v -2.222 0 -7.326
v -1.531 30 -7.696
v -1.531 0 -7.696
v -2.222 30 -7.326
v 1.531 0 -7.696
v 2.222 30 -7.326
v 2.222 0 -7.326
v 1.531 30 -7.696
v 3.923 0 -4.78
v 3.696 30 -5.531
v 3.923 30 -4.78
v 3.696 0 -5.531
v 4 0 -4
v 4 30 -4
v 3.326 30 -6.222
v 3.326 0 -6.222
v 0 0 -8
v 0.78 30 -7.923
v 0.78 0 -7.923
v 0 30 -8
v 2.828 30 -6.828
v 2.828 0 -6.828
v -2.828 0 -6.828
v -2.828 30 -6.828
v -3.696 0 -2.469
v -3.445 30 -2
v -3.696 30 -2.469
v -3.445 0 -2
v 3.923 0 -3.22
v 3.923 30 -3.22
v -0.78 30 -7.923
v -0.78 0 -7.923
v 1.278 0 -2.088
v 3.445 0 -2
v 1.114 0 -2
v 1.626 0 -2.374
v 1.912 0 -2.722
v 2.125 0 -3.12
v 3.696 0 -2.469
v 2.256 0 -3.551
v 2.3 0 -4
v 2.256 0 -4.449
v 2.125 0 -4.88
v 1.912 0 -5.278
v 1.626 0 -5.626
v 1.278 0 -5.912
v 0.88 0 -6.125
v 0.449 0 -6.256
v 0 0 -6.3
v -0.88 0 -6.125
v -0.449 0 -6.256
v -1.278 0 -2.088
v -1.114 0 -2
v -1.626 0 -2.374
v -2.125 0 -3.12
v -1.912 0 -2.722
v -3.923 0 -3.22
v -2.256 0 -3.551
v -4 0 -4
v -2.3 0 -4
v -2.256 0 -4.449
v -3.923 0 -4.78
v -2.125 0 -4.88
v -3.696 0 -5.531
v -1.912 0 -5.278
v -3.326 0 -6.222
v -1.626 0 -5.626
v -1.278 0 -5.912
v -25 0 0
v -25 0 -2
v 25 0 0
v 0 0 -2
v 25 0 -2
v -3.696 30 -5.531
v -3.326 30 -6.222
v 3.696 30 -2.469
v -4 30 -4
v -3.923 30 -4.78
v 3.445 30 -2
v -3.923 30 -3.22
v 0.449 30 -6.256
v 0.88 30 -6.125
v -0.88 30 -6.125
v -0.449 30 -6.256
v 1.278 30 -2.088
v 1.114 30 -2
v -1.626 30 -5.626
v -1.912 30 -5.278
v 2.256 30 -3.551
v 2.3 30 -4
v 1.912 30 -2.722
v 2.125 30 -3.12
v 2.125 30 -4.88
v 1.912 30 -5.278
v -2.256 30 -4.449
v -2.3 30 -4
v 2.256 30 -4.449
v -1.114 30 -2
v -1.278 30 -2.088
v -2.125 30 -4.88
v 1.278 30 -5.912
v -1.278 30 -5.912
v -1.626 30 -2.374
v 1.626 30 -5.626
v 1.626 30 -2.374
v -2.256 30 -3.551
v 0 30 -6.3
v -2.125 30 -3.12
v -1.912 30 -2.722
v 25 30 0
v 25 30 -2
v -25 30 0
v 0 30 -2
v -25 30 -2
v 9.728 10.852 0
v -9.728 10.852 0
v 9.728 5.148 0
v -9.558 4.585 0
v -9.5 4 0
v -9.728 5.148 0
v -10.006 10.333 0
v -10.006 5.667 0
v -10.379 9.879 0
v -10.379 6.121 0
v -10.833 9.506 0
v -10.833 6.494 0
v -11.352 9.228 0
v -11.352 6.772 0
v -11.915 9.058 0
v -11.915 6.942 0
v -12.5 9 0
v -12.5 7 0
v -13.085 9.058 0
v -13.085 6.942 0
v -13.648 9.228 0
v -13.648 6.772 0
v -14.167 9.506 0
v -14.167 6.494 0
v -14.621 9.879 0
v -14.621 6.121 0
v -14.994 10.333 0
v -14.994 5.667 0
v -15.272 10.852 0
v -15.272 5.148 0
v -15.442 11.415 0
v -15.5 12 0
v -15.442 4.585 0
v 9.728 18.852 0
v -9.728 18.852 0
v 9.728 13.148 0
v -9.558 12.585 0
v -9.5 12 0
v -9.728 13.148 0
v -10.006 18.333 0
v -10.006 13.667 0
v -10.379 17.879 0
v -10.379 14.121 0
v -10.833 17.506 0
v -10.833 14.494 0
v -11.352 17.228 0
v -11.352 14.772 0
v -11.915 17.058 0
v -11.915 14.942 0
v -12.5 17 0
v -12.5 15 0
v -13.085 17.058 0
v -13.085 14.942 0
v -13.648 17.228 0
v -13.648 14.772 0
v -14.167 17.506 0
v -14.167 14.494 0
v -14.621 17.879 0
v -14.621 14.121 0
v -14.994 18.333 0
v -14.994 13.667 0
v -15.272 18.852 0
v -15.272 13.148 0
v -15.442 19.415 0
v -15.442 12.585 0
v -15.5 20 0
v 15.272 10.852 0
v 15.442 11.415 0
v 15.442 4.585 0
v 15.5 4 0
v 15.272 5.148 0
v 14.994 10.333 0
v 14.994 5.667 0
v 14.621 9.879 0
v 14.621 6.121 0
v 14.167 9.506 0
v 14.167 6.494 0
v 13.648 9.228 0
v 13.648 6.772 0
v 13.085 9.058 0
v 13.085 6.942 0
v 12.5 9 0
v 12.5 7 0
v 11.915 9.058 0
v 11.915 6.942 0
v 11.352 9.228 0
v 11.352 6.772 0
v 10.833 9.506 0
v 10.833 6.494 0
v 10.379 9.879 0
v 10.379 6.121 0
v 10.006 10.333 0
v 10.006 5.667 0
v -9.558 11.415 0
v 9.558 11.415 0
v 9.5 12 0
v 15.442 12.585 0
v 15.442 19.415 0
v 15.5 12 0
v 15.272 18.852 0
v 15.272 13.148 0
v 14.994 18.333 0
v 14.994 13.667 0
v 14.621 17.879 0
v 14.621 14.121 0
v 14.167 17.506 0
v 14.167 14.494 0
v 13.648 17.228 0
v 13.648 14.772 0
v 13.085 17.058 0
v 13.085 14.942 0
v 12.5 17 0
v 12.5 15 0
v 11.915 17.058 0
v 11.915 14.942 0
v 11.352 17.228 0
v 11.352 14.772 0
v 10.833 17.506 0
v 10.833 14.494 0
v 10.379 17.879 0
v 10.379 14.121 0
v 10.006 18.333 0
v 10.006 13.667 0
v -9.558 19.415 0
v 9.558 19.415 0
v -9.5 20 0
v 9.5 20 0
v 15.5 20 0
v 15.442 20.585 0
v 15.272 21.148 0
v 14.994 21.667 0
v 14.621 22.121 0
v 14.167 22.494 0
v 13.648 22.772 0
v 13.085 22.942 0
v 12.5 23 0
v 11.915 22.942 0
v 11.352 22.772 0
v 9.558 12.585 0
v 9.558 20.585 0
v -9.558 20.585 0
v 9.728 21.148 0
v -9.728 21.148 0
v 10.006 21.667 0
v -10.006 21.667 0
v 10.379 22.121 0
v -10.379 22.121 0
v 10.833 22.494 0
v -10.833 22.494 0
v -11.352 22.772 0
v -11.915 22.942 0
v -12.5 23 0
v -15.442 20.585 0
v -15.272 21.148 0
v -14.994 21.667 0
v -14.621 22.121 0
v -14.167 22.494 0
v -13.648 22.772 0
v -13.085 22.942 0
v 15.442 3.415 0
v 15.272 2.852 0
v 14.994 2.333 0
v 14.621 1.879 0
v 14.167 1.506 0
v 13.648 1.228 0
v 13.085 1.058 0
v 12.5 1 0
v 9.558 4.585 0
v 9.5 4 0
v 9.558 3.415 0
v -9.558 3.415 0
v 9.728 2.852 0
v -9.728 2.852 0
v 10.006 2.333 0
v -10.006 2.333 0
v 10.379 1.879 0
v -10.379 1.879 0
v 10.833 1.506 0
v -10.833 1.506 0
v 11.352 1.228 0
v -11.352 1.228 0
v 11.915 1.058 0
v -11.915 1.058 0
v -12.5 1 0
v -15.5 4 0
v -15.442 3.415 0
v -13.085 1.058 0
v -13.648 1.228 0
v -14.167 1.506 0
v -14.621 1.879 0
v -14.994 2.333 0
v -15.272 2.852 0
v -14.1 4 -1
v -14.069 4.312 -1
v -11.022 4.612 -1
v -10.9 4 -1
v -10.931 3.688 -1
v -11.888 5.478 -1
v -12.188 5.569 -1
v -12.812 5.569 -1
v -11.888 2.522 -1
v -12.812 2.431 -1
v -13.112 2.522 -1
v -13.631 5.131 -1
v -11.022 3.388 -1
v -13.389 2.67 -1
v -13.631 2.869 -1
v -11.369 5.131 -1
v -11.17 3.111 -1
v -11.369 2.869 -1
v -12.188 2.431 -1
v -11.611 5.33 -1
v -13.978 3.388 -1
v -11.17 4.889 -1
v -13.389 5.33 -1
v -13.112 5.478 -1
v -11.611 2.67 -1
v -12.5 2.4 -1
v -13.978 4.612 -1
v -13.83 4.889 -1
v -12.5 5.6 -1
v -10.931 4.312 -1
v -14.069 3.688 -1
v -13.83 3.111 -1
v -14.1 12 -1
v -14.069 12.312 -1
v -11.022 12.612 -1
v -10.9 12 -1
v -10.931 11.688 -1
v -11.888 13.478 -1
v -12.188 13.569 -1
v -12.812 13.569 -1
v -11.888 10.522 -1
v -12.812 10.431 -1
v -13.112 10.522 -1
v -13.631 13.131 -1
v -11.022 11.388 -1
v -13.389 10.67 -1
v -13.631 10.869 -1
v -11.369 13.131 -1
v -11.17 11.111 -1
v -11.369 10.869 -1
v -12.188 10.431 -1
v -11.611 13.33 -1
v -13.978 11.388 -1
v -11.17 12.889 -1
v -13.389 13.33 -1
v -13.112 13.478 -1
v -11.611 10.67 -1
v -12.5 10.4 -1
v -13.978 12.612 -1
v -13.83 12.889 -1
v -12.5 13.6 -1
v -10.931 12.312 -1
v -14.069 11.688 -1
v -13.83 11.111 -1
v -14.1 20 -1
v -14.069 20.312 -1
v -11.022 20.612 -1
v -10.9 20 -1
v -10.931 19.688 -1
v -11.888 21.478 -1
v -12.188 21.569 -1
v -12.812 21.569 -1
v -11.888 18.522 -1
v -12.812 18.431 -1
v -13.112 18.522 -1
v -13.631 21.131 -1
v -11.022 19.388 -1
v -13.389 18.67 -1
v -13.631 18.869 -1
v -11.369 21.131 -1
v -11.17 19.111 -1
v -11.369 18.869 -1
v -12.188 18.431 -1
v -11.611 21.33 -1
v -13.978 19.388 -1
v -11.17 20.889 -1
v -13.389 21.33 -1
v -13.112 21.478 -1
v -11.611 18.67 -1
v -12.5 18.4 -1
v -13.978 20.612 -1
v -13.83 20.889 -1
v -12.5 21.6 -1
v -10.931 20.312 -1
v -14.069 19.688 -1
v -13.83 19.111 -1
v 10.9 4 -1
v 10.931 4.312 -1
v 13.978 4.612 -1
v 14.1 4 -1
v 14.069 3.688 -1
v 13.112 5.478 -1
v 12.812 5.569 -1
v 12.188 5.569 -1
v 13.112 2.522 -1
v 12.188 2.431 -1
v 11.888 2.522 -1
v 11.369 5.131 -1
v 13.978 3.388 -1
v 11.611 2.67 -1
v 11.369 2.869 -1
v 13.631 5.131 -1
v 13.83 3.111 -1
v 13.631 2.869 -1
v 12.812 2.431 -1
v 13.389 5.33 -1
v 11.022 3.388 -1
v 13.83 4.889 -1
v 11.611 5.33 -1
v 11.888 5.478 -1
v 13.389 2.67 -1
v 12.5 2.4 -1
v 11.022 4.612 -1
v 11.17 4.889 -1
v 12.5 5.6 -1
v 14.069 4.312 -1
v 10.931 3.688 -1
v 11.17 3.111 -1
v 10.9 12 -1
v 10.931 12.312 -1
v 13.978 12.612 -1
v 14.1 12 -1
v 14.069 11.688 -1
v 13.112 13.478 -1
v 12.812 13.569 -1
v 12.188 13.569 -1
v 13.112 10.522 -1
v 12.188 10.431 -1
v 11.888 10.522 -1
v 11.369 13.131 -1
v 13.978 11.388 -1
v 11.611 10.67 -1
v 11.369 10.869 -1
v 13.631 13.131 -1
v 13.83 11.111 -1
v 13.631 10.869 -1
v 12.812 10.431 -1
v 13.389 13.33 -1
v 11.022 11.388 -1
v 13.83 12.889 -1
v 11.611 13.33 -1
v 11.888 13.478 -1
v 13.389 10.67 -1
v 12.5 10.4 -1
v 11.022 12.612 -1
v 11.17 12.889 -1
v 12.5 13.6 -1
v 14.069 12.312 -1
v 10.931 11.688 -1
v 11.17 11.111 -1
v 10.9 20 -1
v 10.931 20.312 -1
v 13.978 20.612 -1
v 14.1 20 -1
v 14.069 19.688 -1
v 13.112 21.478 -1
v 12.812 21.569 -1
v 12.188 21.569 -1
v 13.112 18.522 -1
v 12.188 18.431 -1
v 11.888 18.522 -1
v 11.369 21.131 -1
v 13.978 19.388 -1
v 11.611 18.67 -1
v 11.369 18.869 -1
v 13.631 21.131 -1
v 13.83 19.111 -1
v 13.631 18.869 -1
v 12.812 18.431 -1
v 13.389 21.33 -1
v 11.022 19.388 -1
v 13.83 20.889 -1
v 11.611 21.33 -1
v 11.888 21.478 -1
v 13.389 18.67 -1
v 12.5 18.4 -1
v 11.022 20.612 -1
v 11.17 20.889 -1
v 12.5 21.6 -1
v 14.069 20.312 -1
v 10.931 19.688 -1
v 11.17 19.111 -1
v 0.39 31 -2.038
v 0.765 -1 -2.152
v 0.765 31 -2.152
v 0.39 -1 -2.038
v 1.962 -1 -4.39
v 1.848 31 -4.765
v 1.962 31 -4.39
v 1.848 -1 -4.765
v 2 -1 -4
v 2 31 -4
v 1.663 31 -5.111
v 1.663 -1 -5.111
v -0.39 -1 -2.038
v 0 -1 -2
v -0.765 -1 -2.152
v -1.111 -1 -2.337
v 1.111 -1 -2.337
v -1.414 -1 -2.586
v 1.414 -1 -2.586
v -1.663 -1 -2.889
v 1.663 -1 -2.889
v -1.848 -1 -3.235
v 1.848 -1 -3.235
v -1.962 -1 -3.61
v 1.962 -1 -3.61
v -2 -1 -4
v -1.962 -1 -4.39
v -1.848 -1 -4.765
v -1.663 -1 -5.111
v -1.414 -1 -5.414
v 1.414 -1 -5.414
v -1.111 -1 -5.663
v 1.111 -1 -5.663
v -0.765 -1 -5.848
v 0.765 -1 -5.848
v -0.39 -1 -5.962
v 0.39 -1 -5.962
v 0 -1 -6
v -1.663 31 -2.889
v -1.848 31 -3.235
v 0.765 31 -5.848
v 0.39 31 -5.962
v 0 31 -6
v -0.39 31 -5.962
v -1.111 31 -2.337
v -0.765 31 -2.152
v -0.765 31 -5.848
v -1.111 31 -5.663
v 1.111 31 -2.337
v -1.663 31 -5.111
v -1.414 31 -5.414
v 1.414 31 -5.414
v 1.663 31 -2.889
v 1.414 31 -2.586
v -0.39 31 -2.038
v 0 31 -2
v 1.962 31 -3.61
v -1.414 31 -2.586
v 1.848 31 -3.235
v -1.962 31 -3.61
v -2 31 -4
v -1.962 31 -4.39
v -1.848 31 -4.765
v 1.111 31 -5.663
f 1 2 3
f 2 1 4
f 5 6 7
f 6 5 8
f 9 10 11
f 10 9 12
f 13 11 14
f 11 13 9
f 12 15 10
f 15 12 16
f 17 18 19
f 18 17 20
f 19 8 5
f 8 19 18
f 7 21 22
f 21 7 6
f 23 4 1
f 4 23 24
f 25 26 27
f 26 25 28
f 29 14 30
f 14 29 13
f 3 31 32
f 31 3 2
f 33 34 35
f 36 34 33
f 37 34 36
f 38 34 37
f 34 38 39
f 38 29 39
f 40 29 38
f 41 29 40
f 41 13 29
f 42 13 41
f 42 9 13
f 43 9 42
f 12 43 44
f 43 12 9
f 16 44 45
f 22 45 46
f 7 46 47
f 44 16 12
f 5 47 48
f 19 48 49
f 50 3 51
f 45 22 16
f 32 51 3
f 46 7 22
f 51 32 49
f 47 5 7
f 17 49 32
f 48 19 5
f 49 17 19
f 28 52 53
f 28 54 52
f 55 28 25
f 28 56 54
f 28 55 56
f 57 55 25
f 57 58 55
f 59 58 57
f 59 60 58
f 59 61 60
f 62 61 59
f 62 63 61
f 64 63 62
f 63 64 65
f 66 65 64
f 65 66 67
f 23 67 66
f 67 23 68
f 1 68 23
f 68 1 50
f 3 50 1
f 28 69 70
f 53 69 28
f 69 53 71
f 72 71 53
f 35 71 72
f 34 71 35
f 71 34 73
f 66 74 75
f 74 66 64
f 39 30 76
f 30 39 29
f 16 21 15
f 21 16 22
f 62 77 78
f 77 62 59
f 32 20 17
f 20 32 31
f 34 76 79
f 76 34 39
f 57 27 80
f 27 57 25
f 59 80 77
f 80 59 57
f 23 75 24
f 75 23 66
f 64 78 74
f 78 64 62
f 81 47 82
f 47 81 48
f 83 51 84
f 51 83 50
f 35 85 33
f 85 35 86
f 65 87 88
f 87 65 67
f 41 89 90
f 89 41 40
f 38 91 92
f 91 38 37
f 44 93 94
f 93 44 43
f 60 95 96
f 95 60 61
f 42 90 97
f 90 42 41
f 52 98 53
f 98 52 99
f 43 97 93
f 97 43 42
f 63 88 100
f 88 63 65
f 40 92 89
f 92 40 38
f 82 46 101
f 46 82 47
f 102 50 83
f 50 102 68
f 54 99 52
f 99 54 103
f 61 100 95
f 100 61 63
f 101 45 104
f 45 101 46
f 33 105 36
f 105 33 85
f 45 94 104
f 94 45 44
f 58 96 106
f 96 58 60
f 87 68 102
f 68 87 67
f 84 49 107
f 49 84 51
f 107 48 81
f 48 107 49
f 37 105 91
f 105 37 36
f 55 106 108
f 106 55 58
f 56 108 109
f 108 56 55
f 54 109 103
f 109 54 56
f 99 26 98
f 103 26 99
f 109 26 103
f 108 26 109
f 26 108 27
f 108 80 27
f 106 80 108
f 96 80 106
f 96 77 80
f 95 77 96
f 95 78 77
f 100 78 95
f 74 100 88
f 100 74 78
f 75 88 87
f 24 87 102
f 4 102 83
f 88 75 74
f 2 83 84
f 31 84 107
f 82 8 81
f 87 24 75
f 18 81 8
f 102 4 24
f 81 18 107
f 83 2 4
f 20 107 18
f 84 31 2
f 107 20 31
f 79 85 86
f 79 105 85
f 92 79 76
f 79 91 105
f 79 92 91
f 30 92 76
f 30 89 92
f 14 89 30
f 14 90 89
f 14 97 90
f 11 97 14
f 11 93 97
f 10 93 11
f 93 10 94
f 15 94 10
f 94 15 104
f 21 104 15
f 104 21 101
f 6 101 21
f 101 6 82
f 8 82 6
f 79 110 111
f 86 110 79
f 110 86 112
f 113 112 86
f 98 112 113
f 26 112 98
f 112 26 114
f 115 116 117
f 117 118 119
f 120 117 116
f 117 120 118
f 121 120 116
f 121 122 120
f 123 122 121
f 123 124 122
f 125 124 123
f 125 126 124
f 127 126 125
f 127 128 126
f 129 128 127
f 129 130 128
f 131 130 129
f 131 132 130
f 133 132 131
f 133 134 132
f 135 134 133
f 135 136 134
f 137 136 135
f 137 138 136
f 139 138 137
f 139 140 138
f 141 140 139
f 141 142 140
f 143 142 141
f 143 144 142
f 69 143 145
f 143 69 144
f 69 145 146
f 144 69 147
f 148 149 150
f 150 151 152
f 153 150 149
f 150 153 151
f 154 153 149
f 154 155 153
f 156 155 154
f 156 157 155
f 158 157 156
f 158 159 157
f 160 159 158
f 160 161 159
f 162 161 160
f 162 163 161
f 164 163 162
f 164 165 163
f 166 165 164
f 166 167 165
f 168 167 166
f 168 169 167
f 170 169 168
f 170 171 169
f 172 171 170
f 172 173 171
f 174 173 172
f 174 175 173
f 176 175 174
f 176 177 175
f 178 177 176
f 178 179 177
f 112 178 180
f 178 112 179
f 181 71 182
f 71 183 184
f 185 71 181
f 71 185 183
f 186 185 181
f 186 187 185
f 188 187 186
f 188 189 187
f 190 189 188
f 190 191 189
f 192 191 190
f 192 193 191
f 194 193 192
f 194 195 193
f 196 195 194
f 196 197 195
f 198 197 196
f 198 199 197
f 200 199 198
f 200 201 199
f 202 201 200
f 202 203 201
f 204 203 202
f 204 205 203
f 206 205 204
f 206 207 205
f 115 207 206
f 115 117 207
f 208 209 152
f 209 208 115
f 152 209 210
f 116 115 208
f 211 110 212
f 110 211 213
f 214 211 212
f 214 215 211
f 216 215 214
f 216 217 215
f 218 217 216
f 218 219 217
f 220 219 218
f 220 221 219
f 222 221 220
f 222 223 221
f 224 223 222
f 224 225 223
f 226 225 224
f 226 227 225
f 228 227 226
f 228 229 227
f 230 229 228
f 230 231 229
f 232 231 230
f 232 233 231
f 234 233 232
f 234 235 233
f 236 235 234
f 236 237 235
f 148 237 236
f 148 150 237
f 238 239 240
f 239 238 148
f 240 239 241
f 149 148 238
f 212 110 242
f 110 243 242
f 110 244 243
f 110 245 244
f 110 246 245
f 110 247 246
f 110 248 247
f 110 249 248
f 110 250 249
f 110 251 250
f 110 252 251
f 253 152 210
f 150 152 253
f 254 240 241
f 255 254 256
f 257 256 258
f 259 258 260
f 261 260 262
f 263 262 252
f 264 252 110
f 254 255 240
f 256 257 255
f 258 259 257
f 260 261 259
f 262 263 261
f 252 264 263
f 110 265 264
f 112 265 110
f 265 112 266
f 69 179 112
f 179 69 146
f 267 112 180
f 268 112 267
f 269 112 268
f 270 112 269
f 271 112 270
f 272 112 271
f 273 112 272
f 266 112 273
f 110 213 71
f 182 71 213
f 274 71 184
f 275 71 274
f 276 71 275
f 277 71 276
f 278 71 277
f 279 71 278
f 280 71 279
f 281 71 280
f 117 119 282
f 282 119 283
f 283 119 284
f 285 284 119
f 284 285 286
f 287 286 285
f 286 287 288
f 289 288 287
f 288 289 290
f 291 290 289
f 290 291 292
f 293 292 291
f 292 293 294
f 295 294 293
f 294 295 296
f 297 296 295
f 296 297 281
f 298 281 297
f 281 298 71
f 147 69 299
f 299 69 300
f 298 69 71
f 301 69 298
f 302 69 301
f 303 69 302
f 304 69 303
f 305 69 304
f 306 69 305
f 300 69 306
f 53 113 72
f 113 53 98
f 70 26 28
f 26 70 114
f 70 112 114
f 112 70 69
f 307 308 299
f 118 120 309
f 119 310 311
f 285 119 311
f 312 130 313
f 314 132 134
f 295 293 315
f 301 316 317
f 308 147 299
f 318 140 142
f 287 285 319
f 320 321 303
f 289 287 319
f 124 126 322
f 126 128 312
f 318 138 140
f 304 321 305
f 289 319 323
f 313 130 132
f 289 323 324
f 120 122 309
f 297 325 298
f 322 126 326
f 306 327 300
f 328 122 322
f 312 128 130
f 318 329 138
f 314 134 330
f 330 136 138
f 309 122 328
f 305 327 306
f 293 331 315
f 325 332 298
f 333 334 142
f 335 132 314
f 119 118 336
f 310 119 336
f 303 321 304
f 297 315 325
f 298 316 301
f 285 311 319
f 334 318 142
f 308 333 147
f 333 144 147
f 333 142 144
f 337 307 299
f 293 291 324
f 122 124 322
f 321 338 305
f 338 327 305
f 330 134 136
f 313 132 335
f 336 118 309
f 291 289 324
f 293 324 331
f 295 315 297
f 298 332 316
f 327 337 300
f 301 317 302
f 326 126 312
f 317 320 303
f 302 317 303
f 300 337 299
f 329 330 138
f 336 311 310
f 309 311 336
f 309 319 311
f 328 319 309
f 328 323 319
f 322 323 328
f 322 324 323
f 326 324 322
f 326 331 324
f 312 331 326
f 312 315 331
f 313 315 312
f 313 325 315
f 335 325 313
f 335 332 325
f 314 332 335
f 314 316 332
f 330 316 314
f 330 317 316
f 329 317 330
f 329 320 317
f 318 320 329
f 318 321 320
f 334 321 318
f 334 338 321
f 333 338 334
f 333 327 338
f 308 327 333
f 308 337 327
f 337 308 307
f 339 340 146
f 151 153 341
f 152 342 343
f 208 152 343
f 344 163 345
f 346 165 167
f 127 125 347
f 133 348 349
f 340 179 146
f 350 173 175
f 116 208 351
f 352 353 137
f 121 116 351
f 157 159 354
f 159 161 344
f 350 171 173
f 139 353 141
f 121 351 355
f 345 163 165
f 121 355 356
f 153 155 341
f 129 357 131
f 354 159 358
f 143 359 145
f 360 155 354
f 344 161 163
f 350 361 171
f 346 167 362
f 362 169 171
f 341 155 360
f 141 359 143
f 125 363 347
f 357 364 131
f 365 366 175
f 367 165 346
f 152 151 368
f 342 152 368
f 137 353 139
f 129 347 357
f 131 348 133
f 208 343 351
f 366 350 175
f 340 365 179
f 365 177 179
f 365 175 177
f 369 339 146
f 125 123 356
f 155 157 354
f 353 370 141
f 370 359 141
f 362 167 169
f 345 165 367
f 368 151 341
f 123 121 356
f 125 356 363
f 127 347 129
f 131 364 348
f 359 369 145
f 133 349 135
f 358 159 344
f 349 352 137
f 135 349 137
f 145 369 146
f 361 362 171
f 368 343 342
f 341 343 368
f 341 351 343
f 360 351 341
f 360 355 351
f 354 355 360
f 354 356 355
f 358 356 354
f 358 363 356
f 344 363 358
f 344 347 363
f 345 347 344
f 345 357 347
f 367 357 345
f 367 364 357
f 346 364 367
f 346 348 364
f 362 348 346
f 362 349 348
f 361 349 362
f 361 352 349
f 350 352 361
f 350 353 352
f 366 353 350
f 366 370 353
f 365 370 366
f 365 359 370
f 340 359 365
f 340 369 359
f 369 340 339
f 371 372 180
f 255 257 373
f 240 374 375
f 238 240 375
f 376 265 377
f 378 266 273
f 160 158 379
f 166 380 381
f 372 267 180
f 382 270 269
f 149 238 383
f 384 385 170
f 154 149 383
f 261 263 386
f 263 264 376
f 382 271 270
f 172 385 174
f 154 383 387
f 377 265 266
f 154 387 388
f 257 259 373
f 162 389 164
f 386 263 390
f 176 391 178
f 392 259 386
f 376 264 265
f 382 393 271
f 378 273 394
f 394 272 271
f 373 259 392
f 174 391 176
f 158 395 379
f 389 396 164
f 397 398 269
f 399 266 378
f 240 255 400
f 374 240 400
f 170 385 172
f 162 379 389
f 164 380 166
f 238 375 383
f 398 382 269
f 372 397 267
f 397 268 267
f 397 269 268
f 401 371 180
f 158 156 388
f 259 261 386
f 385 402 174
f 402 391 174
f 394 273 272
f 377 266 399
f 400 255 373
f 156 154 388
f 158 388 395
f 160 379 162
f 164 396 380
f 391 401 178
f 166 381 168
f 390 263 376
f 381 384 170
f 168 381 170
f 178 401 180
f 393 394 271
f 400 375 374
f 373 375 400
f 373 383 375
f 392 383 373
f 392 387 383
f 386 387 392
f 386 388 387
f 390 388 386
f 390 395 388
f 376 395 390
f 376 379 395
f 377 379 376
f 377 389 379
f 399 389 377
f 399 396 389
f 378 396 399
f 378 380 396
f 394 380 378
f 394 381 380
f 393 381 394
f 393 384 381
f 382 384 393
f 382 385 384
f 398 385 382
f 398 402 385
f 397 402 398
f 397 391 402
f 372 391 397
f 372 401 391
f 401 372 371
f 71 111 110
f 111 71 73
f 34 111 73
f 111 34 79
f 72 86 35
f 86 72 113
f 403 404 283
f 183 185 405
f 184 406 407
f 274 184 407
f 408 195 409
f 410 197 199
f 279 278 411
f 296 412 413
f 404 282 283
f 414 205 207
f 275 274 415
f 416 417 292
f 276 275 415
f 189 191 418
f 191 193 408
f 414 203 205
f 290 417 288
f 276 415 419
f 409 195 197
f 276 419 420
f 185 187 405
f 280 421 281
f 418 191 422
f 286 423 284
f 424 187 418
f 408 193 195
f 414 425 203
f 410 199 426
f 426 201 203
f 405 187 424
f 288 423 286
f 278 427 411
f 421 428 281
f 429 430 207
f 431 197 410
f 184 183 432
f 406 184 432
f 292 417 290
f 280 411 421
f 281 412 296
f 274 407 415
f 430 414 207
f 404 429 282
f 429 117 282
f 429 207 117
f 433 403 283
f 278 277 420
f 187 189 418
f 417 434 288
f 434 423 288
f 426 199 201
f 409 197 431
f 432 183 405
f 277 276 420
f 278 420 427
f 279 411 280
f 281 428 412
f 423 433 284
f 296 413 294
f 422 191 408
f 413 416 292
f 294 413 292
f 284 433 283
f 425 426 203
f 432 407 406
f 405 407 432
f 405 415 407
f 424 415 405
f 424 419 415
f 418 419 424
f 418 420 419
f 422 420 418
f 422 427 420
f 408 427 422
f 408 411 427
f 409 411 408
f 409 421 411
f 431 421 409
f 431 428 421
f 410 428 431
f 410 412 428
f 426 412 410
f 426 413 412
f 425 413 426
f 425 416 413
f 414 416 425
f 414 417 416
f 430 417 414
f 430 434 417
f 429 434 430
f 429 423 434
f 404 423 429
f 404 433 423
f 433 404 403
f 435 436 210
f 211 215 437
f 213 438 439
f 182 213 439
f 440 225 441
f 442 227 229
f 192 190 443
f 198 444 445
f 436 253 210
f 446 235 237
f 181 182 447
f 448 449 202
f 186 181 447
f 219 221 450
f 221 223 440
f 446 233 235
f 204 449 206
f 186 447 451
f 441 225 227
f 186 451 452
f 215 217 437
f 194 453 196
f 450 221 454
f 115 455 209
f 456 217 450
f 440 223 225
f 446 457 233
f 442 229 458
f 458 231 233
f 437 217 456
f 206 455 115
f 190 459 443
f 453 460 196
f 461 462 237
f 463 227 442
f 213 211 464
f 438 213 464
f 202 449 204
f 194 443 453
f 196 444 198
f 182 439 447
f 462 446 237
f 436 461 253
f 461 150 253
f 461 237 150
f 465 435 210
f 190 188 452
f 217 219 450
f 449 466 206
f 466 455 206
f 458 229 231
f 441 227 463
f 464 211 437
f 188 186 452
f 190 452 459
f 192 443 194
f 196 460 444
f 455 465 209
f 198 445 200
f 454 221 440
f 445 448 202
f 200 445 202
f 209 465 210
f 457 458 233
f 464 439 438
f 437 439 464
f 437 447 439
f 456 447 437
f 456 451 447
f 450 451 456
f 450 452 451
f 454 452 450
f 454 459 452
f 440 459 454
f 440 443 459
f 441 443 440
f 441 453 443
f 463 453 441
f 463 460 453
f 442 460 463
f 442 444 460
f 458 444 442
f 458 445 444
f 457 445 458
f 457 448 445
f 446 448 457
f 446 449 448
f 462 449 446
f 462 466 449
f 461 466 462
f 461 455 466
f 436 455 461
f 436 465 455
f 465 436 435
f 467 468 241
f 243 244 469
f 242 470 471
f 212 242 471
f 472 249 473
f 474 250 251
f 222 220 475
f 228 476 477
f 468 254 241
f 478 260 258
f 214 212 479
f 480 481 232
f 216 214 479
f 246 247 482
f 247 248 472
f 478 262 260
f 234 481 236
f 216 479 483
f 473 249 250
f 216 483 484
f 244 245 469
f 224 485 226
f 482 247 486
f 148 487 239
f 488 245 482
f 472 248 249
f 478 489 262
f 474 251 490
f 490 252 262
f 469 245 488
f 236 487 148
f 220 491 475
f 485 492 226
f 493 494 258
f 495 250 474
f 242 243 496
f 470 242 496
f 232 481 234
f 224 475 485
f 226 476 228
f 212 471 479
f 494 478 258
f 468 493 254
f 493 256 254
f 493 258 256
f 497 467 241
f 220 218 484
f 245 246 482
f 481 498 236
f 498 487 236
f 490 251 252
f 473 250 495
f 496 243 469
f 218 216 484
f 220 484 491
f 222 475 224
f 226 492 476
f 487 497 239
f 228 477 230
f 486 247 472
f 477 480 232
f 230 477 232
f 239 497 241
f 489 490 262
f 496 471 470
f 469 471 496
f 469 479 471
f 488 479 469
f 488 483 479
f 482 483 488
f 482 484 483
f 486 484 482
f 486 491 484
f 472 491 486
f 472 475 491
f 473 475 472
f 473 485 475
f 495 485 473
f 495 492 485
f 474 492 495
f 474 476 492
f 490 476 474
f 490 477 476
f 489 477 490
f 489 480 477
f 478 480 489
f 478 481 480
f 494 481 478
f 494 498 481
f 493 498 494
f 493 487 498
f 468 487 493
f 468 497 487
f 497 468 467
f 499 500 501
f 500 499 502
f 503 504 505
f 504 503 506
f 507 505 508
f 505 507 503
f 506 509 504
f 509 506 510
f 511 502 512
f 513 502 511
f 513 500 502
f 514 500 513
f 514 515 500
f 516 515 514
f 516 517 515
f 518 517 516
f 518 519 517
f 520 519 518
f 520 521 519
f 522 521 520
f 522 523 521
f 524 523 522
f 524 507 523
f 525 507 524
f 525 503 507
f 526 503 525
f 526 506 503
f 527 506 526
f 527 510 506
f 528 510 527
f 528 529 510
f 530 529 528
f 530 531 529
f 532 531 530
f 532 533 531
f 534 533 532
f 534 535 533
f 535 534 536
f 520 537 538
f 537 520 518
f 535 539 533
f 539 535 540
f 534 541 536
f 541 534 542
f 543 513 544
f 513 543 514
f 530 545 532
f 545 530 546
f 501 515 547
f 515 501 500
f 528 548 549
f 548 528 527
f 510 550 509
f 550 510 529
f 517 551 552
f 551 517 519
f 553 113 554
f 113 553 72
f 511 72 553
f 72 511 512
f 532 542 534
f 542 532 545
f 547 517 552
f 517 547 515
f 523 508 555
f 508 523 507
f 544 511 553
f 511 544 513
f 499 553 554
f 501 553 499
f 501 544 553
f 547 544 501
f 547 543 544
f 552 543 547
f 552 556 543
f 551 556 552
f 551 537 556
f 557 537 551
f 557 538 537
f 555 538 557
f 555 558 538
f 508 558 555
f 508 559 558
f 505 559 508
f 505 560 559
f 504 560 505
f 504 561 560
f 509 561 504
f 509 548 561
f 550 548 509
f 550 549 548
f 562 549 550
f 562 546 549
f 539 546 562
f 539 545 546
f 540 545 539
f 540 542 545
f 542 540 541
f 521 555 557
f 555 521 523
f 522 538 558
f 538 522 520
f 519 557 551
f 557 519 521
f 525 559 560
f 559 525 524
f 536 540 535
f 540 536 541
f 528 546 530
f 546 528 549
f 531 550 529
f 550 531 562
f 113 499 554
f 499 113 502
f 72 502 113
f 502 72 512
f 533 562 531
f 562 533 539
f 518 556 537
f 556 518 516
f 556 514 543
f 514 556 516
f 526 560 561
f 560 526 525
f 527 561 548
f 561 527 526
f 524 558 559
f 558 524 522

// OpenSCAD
// Butt Hinge - 180° open state
// Pin axis along Y, leaves flat in XZ plane at z=0..2

// Parameters
leaf_w = 25;    // width (x direction)
leaf_h = 30;    // height (y direction)
leaf_t = 2;     // thickness (z direction)

pin_d = 4;
pin_r = pin_d / 2;
pin_len = 32;

knuckle_od = 8;
knuckle_or = knuckle_od / 2;
knuckle_id = 4.6;
knuckle_ir = knuckle_id / 2;
knuckle_h = 6;

// Screw holes
screw_d = 3.2;
cs_d = 6;
cs_depth = 1;
screw_count = 3;
screw_pitch = 8;
screw_x_offset = leaf_w / 2; // center of screw zone

// Left leaf: x from -leaf_w to 0, knuckles at x=0 side
// Right leaf: x from 0 to leaf_w, knuckles at x=0 side
// Both leaves lie in z = -leaf_t to 0 plane (top face at z=0)

module countersunk_hole(depth=leaf_t) {
    // Countersink: cone from diameter cs_d at top to screw_d, depth cs_depth
    // Then through hole screw_d for remaining depth
    union() {
        cylinder(d1=cs_d, d2=screw_d, h=cs_depth, $fn=32);
        translate([0,0,-depth+cs_depth])
            cylinder(d=screw_d, h=depth-cs_depth+0.01, $fn=32);
    }
}

module knuckle() {
    difference() {
        cylinder(d=knuckle_od, h=knuckle_h, $fn=32);
        translate([0,0,-0.1])
            cylinder(d=knuckle_id, h=knuckle_h+0.2, $fn=32);
    }
}

module left_leaf() {
    // Leaf body: x from -leaf_w to 0, y from -1 to 29 (pin offset by 1), z from -leaf_t to 0
    // Pin starts at y=-1, so leaf y from 0 to 30 mapped to pin y 0..30
    // Actually: leaf y from 0 to 30, knuckles centered on x=0 edge
    
    difference() {
        union() {
            // Main leaf plate
            translate([-leaf_w, 0, -leaf_t])
                cube([leaf_w, leaf_h, leaf_t]);
            
            // Left leaf knuckles: positions 0,2,4 (y=0,12,24) -> centers at y=3,15,27
            // knuckle 1: y=0..6, knuckle 3: y=12..18, knuckle 5: y=24..30
            for(i = [0, 2, 4]) {
                translate([0, i*knuckle_h, -knuckle_od/2])
                    rotate([-90, 0, 0])
                        // knuckle centered on x=0, extending in +x direction around pin
                        // Actually knuckle is a cylinder along y axis
                        translate([0, 0, 0])
                            knuckle();
            }
        }
        
        // Screw holes on leaf (top face z=0, going down)
        // Screws along y axis, x centered at -leaf_w/2
        for(i = [0:screw_count-1]) {
            translate([-leaf_w/2, 4 + i*screw_pitch, 0])
                rotate([180, 0, 0])
                    countersunk_hole(leaf_t);
        }
    }
}

module right_leaf() {
    difference() {
        union() {
            // Main leaf plate
            translate([0, 0, -leaf_t])
                cube([leaf_w, leaf_h, leaf_t]);
            
            // Right leaf knuckles: positions 1,3 (y=6..12, y=18..24)
            for(i = [1, 3]) {
                translate([0, i*knuckle_h, -knuckle_od/2])
                    rotate([-90, 0, 0])
                        knuckle();
            }
        }
        
        // Screw holes
        for(i = [0:screw_count-1]) {
            translate([leaf_w/2, 4 + i*screw_pitch, 0])
                rotate([180, 0, 0])
                    countersunk_hole(leaf_t);
        }
    }
}

module pin() {
    translate([0, -1, -knuckle_od/2])
        rotate([-90, 0, 0])
            cylinder(d=pin_d, h=pin_len, $fn=32);
}

// Render all parts
color("silver") left_leaf();
color("silver") right_leaf();
color("gold")   pin();
